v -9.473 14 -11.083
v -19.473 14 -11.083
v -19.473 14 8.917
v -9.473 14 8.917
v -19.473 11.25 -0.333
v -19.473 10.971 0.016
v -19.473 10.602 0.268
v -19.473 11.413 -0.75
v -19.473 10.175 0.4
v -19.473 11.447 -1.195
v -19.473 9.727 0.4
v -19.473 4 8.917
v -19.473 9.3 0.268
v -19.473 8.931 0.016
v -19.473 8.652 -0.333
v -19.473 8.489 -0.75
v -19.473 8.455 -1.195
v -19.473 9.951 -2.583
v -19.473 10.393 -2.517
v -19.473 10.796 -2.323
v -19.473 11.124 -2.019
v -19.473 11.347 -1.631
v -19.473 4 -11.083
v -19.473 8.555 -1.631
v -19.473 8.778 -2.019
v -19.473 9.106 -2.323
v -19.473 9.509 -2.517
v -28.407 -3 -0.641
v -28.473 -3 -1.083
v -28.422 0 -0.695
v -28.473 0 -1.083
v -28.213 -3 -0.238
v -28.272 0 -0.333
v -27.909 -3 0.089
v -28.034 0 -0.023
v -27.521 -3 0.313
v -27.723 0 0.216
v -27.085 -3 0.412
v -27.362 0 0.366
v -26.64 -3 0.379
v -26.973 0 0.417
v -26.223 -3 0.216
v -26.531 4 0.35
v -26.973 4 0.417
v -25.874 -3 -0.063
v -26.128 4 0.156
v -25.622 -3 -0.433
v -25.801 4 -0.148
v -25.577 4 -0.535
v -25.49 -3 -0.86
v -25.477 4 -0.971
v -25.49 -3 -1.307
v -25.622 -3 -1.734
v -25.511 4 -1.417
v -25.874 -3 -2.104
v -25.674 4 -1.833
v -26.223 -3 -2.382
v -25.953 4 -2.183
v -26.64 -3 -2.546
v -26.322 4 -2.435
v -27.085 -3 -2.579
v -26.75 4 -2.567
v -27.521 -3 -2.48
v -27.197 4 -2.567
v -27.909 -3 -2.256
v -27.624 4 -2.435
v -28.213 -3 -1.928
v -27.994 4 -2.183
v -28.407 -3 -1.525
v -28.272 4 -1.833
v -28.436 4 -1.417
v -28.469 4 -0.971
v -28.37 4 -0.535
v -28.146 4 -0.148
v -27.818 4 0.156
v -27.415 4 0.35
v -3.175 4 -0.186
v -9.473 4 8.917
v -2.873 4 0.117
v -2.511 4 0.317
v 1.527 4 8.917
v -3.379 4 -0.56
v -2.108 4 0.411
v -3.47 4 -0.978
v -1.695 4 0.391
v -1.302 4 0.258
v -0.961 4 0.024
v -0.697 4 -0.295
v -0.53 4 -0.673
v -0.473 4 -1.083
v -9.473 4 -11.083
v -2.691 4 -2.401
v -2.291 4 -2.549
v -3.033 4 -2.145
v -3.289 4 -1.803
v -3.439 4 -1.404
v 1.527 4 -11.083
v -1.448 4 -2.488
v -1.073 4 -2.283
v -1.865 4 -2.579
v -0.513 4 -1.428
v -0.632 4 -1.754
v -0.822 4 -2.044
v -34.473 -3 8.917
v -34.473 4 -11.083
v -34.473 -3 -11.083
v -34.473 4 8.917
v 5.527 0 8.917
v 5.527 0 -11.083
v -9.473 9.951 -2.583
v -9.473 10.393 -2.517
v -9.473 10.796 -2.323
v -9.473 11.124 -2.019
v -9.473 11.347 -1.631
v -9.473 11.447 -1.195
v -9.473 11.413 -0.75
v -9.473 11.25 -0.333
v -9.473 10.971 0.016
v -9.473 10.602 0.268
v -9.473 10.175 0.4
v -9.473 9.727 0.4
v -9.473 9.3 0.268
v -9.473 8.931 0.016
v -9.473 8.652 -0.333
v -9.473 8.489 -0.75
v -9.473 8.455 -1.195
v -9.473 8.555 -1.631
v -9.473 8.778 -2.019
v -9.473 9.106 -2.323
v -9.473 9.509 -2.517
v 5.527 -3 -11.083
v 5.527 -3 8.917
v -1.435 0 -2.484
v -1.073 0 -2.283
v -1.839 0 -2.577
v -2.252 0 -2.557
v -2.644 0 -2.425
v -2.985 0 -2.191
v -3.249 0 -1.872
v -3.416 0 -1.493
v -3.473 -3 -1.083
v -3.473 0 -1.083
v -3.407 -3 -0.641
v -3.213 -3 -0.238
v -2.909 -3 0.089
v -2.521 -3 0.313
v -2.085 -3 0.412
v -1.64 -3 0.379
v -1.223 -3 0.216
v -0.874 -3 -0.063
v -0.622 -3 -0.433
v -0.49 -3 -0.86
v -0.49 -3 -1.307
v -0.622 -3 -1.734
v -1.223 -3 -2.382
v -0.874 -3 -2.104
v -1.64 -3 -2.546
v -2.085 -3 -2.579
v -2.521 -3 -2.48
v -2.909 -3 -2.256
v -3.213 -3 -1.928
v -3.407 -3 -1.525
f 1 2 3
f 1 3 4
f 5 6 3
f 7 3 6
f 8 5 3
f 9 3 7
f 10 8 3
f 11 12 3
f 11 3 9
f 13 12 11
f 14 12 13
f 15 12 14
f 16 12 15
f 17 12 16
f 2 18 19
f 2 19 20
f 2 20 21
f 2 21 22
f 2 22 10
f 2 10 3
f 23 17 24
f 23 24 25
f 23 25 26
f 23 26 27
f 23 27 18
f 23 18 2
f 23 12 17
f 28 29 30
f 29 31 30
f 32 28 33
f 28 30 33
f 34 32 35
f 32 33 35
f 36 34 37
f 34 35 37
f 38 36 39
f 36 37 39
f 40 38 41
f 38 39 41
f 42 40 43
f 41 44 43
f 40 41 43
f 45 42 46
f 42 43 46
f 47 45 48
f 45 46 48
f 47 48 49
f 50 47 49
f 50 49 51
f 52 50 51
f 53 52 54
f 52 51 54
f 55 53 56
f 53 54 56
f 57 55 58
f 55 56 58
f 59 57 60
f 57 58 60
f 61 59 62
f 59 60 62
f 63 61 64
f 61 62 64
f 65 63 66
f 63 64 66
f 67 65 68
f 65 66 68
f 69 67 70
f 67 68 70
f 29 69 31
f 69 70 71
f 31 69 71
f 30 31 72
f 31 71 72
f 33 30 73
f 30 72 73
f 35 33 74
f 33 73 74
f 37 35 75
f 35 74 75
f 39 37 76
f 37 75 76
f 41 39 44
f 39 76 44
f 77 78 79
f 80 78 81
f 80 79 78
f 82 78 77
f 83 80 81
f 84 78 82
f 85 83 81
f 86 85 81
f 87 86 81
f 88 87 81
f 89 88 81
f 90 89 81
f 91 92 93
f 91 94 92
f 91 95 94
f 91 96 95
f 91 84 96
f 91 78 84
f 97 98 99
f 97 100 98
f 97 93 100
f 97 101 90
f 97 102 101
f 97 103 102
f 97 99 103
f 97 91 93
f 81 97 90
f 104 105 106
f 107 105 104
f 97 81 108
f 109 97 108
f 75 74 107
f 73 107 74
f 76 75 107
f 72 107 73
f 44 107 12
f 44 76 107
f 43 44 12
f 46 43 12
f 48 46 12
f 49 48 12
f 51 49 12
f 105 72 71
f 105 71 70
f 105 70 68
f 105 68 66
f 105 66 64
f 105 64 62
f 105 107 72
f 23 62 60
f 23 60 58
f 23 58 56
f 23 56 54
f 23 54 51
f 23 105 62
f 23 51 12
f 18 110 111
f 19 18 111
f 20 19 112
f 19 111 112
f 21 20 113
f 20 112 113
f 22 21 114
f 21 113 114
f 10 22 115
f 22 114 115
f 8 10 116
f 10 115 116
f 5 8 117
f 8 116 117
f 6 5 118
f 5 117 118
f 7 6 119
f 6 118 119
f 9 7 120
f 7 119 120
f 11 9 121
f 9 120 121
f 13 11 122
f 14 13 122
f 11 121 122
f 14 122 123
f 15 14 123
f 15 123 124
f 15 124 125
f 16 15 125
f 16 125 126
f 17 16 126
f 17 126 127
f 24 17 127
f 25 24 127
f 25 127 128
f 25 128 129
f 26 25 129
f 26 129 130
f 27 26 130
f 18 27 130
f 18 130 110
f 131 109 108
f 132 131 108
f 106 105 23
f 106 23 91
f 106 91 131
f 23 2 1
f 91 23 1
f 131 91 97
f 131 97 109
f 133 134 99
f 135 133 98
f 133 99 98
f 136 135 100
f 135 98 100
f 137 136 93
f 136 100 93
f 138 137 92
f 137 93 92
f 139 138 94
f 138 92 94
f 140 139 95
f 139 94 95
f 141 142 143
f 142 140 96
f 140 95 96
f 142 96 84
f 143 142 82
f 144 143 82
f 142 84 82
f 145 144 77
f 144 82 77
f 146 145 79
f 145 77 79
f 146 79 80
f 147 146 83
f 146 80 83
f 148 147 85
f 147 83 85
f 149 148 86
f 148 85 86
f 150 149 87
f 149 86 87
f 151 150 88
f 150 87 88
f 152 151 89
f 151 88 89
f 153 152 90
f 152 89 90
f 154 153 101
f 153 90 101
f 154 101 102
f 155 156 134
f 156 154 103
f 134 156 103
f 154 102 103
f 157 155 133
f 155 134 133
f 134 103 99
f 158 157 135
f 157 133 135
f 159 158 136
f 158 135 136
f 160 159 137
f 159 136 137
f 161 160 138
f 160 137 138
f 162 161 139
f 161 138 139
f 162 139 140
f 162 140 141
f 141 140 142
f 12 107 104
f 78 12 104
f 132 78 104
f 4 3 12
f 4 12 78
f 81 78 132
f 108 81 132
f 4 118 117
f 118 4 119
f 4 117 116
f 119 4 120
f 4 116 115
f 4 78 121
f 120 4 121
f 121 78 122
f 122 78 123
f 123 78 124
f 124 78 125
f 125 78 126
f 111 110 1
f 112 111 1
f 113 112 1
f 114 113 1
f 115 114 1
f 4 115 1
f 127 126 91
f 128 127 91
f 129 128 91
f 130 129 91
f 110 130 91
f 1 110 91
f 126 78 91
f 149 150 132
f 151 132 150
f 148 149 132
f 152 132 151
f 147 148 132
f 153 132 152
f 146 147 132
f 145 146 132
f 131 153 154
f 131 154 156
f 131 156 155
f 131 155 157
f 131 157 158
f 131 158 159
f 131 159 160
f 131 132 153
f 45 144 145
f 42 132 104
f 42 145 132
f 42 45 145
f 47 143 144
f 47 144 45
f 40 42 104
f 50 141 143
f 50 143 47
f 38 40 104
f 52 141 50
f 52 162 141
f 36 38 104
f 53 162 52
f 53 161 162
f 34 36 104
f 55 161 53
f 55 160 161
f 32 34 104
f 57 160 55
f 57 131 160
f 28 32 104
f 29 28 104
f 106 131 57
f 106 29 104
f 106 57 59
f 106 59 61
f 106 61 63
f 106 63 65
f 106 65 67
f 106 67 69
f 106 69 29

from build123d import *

# Parameters (mm, degrees)
SKETCH1_W               = 40
SKETCH1_H               = 20
BOSS_EXTRUDE1_DEPTH     = 4
SKETCH2_W               = 10
SKETCH2_H               = 20
BOSS_EXTRUDE2_DEPTH     = 10
SKETCH3_R               = 1.5
CUT_EXTRUDE1_DEPTH      = 20
SKETCH4_R               = 1.5
CUT_EXTRUDE2_DEPTH      = 20
CUT_EXTRUDE3_DEPTH      = 43.242250662
CUT_EXTRUDE3_DEPTH_BACK = 20
SKETCH6_W               = 40
SKETCH6_H               = 20
BOSS_EXTRUDE3_DEPTH     = 4.5
CUT_EXTRUDE5_DEPTH      = 4.5
CUT_EXTRUDE6_DEPTH      = 14.5
SKETCH9_W               = 40
SKETCH9_H               = 20
CUT_EXTRUDE7_DEPTH      = 1.5


with BuildPart() as part:
    # Sketch1 → Boss-Extrude1 (new body)
    with BuildSketch(Plane(origin=(0, 0, 0), x_dir=(1, 0, 0), z_dir=(0, 1, 0))):
        with Locations((-14.473290255, 1.083337988)):
            Rectangle(SKETCH1_W, SKETCH1_H)
    extrude(amount=BOSS_EXTRUDE1_DEPTH)

    # Sketch2 → Boss-Extrude2 (add)
    with BuildSketch(Plane(origin=(0, 4, 0), x_dir=(1, 0, 0), z_dir=(0, 1, 0))):
        with Locations((-14.473290255, 1.083337988)):
            Rectangle(SKETCH2_W, SKETCH2_H)
    extrude(amount=BOSS_EXTRUDE2_DEPTH)

    # Sketch3 → Cut-Extrude1 (cut)
    with BuildSketch(Plane(origin=(-9.473290255, 0, 0), x_dir=(0, 0, -1), z_dir=(1, 0, 0))):
        with Locations((1.083337988, 9.951)):
            Circle(SKETCH3_R)
    extrude(amount=-CUT_EXTRUDE1_DEPTH, mode=Mode.SUBTRACT)

    # Sketch4 → Cut-Extrude2 (cut)
    with BuildSketch(Plane(origin=(0, 4, 0), x_dir=(1, 0, 0), z_dir=(0, 1, 0))):
        with BuildLine():
            ThreePointArc((-1.073290255, 2.283337988), (-3.173290255, 1.983337988), (-2.873290255, -0.116662012))
            Line((-2.873290255, -0.116662012), (-1.073290255, 2.283337988))
        make_face()
        with BuildLine():
            Line((-1.073290255, 2.283337988), (-2.873290255, -0.116662012))
            ThreePointArc((-2.873290255, -0.116662012), (-1.302469862, -0.258302799), (-0.473290255, 1.083337988))
            ThreePointArc((-0.473290255, 1.083337988), (-0.631649468, 1.754158381), (-1.073290255, 2.283337988))
        make_face()
        with Locations(Location((-26.973290255, 1.083337988, 0), (0, 0, 270))):
            Circle(SKETCH4_R)
    extrude(amount=-CUT_EXTRUDE2_DEPTH, mode=Mode.SUBTRACT)

    # Sketch5 → Cut-Extrude3 (cut, two sides)
    with BuildSketch(Plane.XY.offset(8.916662012)) as cut_extrude3_sk:
        Polygon((100.285190147, 4), (5.526709745, 4), (1.526709745, 4), (5.526709745, 0), (72.531073812, -67.004364067), (249.0428395, -135.999110287), (276.796955834, -64.99474622), align=None)
    extrude(amount=CUT_EXTRUDE3_DEPTH, mode=Mode.SUBTRACT)
    extrude(cut_extrude3_sk.sketch, amount=-CUT_EXTRUDE3_DEPTH_BACK, mode=Mode.SUBTRACT)

    # Sketch6 → Boss-Extrude3 (add)
    with BuildSketch(Plane.XZ):
        with Locations((-14.473290255, -1.083337988)):
            Rectangle(SKETCH6_W, SKETCH6_H)
    extrude(amount=BOSS_EXTRUDE3_DEPTH)

    # Sketch7 → Cut-Extrude5 (cut)
    with BuildSketch(Plane(origin=(0, 0, 0), x_dir=(1, 0, 0), z_dir=(0, 1, 0))):
        with BuildLine():
            ThreePointArc((-0.473290255, 1.083337988), (-1.973290255, 2.583337988), (-3.473290255, 1.083337988))
            Line((-3.473290255, 1.083337988), (-0.473290255, 1.083337988))
        make_face()
        with BuildLine():
            Line((-0.473290255, 1.083337988), (-3.473290255, 1.083337988))
            ThreePointArc((-3.473290255, 1.083337988), (-1.973290255, -0.416662012), (-0.473290255, 1.083337988))
        make_face()
    extrude(amount=-CUT_EXTRUDE5_DEPTH, mode=Mode.SUBTRACT)

    # Sketch8 → Cut-Extrude6 (cut)
    with BuildSketch(Plane(origin=(0, 4, 0), x_dir=(1, 0, 0), z_dir=(0, 1, 0))):
        with BuildLine():
            ThreePointArc((-25.473290255, 1.083337988), (-26.973290255, 2.583337988), (-28.473290255, 1.083337988))
            Line((-28.473290255, 1.083337988), (-25.473290255, 1.083337988))
        make_face()
        with BuildLine():
            Line((-25.473290255, 1.083337988), (-28.473290255, 1.083337988))
            ThreePointArc((-28.473290255, 1.083337988), (-26.973290255, -0.416662012), (-25.473290255, 1.083337988))
        make_face()
    extrude(amount=-CUT_EXTRUDE6_DEPTH, mode=Mode.SUBTRACT)

    # Sketch9 → Cut-Extrude7 (cut)
    with BuildSketch(Plane(origin=(0, -4.5, 0), x_dir=(-1, 0, 0), z_dir=(0, -1, 0))):
        with Locations((14.473290255, 1.083337988)):
            Rectangle(SKETCH9_W, SKETCH9_H)
    extrude(amount=-CUT_EXTRUDE7_DEPTH, mode=Mode.SUBTRACT)


solid = part.part
